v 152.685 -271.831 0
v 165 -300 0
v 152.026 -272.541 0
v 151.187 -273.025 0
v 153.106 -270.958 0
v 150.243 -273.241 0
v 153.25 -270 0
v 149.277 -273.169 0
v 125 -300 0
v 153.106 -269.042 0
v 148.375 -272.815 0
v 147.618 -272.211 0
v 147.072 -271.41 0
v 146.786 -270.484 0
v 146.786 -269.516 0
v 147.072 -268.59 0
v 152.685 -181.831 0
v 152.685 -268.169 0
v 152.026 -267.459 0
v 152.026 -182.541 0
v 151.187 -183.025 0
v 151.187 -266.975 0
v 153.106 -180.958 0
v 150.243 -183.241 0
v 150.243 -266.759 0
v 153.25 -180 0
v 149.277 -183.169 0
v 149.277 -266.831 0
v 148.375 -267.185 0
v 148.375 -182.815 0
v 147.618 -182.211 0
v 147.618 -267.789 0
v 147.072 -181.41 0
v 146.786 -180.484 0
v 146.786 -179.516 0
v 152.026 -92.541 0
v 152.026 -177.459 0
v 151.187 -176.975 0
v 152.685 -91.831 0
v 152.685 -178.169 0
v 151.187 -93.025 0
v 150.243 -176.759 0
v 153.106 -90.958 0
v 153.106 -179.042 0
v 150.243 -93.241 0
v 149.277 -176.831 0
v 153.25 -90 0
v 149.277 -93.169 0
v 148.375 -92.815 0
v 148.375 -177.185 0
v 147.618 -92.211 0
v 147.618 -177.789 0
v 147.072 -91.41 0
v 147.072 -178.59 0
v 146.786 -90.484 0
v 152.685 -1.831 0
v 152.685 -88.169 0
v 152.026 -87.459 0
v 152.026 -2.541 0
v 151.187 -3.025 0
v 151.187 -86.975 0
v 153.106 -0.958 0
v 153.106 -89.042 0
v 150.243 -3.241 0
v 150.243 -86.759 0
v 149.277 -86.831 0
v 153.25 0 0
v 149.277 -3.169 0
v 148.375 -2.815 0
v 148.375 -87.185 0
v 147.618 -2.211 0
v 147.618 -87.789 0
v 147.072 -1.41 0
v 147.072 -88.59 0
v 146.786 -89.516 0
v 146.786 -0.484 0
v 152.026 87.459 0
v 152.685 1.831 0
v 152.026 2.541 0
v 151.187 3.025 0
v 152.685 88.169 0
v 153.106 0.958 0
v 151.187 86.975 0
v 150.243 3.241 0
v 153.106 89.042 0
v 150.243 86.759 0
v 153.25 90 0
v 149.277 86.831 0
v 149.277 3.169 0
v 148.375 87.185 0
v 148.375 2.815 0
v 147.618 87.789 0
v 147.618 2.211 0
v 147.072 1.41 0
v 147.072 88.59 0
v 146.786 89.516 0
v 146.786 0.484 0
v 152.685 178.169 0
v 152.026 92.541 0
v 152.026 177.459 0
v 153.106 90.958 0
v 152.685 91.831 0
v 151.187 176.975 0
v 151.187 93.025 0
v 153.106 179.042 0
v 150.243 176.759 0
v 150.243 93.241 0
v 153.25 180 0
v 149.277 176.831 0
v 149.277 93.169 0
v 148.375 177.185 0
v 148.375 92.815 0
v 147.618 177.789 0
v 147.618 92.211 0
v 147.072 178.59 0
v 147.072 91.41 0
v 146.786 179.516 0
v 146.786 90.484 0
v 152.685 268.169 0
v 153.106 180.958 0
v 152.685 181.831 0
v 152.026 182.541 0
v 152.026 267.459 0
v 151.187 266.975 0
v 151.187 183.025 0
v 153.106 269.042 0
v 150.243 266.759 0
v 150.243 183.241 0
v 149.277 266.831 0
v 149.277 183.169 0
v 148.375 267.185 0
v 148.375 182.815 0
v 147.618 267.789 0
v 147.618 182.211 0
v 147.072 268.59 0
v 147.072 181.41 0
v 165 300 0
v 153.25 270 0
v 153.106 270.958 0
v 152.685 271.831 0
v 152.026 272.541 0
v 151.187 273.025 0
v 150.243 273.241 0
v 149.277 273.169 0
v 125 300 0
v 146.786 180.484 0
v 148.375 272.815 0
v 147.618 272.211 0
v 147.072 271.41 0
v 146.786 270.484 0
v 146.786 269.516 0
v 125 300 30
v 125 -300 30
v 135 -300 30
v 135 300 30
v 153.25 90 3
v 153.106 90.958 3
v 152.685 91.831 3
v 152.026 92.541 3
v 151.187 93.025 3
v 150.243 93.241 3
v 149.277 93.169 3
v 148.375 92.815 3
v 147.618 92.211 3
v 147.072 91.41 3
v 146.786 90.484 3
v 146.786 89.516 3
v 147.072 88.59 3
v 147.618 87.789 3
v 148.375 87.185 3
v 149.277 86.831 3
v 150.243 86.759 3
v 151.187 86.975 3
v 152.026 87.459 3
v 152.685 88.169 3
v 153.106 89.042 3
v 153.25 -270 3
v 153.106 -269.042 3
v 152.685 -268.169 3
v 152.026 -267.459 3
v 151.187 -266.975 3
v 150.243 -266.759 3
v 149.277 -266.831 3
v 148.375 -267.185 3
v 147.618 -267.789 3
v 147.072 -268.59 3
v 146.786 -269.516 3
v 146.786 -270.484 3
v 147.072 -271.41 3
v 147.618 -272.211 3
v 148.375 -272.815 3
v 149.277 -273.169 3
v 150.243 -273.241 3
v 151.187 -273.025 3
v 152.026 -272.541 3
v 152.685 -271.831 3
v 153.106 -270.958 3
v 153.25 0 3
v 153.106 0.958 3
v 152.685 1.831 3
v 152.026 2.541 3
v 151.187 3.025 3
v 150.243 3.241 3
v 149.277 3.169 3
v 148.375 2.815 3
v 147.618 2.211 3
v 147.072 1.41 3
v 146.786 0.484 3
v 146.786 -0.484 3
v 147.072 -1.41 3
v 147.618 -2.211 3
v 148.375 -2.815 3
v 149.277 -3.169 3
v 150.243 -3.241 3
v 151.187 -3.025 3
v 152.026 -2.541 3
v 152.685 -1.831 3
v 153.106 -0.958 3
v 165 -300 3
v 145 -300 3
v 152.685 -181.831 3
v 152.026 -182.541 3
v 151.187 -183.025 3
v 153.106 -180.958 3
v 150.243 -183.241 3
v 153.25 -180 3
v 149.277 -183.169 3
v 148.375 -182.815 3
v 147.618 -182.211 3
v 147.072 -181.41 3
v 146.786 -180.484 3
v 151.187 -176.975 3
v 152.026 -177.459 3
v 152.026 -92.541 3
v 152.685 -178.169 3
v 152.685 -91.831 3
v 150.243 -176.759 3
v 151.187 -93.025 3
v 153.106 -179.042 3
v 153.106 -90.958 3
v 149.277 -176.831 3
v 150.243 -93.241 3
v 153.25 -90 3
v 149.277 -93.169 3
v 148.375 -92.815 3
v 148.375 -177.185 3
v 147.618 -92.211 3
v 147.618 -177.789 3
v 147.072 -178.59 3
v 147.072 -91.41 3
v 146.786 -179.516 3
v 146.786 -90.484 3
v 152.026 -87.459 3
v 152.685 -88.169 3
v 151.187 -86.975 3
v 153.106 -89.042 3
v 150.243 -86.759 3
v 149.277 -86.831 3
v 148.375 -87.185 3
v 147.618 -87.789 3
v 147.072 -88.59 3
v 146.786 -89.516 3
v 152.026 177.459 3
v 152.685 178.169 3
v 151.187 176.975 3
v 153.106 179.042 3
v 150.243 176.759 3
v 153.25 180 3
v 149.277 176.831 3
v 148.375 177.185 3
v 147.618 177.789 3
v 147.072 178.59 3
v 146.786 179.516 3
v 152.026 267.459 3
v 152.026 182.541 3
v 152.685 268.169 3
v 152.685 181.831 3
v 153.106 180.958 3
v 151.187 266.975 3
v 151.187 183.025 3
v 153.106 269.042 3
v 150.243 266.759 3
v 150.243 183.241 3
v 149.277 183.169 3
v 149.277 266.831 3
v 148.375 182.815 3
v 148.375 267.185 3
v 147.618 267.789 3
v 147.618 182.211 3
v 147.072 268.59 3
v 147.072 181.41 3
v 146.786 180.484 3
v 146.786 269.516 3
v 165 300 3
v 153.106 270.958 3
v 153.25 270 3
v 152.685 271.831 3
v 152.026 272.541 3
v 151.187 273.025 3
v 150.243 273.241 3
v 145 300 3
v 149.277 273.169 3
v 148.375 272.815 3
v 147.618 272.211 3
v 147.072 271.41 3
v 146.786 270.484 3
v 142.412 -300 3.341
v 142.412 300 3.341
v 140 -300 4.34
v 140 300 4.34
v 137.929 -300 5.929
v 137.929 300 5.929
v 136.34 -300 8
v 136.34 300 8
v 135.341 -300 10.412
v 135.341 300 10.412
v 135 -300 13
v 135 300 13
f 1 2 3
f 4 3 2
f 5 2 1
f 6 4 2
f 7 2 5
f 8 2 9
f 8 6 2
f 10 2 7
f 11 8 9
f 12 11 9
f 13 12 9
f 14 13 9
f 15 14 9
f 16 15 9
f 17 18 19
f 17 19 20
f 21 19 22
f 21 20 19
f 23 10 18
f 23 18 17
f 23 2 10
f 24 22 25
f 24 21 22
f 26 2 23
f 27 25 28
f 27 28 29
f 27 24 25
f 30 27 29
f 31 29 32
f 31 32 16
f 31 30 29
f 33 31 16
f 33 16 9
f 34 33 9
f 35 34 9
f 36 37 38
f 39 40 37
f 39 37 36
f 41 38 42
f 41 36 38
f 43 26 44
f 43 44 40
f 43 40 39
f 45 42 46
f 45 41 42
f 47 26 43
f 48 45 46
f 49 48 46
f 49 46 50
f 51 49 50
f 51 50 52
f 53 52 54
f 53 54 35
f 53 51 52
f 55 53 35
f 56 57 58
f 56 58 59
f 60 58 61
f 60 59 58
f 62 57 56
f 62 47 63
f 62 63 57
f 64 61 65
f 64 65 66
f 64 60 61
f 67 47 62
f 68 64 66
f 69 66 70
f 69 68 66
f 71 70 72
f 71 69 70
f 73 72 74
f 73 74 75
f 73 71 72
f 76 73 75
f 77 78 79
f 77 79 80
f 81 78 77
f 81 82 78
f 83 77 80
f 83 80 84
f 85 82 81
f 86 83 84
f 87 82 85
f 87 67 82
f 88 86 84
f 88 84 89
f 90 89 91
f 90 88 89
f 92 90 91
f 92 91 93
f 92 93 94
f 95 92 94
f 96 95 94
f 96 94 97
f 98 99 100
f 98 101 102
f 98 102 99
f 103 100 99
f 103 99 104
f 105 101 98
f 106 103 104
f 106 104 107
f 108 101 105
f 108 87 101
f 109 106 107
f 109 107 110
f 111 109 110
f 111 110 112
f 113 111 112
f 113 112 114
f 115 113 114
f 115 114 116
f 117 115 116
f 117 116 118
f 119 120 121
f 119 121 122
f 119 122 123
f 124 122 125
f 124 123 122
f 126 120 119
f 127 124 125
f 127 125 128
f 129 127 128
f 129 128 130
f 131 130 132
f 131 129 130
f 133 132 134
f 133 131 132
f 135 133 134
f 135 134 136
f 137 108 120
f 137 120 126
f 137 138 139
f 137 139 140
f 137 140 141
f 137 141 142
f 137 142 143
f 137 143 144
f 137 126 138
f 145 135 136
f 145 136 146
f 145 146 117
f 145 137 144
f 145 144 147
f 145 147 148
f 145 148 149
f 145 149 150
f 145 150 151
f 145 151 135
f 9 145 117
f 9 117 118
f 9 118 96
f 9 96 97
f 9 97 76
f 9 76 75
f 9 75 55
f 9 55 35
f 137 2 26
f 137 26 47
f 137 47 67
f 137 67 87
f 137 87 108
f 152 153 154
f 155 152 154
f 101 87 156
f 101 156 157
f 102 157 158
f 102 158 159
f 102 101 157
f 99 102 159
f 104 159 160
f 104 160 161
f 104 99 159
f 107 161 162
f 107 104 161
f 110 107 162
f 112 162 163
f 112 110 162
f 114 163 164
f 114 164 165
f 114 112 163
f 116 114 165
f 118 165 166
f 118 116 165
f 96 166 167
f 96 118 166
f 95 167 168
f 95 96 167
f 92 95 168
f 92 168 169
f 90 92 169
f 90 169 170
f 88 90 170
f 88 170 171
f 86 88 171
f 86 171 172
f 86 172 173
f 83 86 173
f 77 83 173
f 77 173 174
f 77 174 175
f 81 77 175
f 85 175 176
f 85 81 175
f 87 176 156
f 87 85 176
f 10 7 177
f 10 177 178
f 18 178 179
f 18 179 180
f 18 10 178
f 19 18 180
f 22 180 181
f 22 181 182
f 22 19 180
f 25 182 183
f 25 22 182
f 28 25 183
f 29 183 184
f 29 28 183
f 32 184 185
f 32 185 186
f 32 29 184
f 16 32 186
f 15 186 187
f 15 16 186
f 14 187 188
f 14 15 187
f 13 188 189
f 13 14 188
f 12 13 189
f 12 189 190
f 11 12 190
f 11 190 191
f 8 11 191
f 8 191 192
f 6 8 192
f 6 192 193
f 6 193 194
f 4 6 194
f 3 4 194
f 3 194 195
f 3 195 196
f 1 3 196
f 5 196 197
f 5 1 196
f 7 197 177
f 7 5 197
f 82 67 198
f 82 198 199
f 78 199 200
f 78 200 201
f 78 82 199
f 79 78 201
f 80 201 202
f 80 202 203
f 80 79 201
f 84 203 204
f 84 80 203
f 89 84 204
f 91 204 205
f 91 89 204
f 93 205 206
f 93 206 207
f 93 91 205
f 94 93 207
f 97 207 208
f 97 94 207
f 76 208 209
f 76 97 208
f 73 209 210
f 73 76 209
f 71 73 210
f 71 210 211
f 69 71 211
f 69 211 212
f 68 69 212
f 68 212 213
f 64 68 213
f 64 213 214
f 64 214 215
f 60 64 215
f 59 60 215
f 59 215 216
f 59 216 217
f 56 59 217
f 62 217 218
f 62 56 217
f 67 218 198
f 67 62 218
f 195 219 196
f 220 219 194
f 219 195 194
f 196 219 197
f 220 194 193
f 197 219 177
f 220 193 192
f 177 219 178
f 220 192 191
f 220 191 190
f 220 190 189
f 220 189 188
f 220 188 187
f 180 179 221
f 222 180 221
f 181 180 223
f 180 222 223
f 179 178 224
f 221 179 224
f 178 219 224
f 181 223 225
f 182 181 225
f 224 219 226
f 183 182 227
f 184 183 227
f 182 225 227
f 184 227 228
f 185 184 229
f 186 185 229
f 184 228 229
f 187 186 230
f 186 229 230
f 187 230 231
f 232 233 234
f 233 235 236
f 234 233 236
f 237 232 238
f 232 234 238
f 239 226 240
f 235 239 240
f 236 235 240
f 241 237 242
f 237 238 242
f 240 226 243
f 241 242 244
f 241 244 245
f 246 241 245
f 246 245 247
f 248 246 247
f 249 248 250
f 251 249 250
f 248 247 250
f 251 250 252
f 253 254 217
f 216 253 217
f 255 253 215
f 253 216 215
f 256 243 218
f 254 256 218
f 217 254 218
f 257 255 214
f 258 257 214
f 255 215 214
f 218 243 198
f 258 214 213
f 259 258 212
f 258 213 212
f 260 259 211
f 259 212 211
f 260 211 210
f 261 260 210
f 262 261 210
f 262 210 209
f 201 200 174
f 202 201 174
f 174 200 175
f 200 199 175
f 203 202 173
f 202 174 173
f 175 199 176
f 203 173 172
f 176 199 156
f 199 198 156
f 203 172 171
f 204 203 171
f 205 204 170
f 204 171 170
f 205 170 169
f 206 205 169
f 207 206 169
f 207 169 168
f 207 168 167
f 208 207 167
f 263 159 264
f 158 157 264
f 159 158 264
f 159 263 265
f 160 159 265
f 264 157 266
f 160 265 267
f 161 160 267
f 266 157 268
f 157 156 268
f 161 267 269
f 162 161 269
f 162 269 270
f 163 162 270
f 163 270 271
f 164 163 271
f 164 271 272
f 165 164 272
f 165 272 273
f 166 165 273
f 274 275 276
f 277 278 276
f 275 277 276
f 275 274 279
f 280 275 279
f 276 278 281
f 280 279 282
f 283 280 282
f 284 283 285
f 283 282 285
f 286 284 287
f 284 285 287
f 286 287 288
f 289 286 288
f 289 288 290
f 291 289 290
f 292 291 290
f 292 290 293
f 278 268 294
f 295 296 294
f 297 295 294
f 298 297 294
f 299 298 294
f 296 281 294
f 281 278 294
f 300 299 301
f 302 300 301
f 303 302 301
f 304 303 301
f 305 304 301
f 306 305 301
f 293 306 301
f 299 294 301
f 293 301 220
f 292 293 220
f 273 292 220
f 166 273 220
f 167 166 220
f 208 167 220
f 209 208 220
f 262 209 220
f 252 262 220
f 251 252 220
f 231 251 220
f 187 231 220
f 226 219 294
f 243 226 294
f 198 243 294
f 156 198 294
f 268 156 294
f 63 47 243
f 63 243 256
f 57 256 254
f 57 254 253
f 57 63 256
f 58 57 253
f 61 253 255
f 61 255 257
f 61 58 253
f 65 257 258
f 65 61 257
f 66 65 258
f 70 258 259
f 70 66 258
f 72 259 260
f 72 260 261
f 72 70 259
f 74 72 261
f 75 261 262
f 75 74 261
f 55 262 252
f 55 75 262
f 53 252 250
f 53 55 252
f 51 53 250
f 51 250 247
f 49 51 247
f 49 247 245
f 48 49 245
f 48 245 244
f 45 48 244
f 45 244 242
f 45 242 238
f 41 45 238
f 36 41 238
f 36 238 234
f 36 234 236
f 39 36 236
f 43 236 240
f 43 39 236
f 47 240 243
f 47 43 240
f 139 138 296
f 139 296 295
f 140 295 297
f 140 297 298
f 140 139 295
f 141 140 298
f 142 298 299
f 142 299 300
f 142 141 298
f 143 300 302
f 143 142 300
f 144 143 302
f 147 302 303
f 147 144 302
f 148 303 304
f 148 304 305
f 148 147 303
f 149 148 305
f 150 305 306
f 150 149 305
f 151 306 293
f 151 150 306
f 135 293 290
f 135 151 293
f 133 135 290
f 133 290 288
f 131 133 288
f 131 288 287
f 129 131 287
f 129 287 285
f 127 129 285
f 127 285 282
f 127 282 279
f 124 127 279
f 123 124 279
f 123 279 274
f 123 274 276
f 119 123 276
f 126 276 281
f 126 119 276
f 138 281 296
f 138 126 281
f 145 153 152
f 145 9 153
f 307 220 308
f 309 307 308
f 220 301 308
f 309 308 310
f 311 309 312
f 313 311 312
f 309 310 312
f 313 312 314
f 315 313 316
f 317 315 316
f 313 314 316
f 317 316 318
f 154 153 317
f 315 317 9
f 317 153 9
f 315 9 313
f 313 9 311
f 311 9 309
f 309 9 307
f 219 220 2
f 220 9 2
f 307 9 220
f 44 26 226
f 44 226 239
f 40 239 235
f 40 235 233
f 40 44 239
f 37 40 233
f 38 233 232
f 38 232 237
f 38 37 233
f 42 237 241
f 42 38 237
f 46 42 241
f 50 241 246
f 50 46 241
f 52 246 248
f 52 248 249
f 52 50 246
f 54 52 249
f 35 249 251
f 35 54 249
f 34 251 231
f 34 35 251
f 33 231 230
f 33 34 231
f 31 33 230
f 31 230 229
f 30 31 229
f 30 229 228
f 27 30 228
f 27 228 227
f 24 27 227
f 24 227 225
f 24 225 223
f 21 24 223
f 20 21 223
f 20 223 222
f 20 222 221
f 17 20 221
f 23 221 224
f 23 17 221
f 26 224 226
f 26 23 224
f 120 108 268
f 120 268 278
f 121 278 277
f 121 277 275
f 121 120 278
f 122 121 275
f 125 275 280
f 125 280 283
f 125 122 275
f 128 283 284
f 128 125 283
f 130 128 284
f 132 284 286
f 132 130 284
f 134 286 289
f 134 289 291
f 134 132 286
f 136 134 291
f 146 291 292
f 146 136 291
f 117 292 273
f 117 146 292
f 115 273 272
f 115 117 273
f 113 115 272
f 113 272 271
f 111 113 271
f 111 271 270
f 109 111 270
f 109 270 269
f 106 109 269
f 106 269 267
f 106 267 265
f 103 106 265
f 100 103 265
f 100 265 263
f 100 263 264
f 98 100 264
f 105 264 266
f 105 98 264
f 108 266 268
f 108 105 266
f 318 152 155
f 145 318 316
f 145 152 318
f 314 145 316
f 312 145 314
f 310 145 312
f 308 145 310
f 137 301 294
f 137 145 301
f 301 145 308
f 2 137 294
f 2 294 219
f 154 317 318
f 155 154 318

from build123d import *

# Parameters (mm, degrees)
SKETCH1_R           = 3.25
BOSS_EXTRUDE1_DEPTH = 3
SKETCH2_W           = 10
SKETCH2_H           = 600
BOSS_EXTRUDE2_DEPTH = 27
FILLET1_R           = 10


with BuildPart() as part:
    # Sketch1 → Boss-Extrude1 (new body)
    with BuildSketch(Plane.XY):
        Polygon((125, -300), (125, 300), (165, 300), (165, -300), (150, -300), align=None)
        with Locations((150, 270)):
            Circle(SKETCH1_R, mode=Mode.SUBTRACT)
        with Locations((150, 180)):
            Circle(SKETCH1_R, mode=Mode.SUBTRACT)
        with Locations((150, 90)):
            Circle(SKETCH1_R, mode=Mode.SUBTRACT)
        with Locations((150, 0)):
            Circle(SKETCH1_R, mode=Mode.SUBTRACT)
        with Locations((150, -90)):
            Circle(SKETCH1_R, mode=Mode.SUBTRACT)
        with Locations((150, -180)):
            Circle(SKETCH1_R, mode=Mode.SUBTRACT)
        with Locations((150, -270)):
            Circle(SKETCH1_R, mode=Mode.SUBTRACT)
    extrude(amount=BOSS_EXTRUDE1_DEPTH)

    # Sketch2 → Boss-Extrude2 (add)
    with BuildSketch(Plane.XY.offset(3)):
        with Locations((130, 0)):
            Rectangle(SKETCH2_W, SKETCH2_H)
    extrude(amount=BOSS_EXTRUDE2_DEPTH)

    # Fillet1
    fillet1_edges = [part.edges().sort_by_distance(p)[0] for p in [
        (135, 0, 3),
    ]]
    fillet(fillet1_edges, radius=FILLET1_R)


solid = part.part
